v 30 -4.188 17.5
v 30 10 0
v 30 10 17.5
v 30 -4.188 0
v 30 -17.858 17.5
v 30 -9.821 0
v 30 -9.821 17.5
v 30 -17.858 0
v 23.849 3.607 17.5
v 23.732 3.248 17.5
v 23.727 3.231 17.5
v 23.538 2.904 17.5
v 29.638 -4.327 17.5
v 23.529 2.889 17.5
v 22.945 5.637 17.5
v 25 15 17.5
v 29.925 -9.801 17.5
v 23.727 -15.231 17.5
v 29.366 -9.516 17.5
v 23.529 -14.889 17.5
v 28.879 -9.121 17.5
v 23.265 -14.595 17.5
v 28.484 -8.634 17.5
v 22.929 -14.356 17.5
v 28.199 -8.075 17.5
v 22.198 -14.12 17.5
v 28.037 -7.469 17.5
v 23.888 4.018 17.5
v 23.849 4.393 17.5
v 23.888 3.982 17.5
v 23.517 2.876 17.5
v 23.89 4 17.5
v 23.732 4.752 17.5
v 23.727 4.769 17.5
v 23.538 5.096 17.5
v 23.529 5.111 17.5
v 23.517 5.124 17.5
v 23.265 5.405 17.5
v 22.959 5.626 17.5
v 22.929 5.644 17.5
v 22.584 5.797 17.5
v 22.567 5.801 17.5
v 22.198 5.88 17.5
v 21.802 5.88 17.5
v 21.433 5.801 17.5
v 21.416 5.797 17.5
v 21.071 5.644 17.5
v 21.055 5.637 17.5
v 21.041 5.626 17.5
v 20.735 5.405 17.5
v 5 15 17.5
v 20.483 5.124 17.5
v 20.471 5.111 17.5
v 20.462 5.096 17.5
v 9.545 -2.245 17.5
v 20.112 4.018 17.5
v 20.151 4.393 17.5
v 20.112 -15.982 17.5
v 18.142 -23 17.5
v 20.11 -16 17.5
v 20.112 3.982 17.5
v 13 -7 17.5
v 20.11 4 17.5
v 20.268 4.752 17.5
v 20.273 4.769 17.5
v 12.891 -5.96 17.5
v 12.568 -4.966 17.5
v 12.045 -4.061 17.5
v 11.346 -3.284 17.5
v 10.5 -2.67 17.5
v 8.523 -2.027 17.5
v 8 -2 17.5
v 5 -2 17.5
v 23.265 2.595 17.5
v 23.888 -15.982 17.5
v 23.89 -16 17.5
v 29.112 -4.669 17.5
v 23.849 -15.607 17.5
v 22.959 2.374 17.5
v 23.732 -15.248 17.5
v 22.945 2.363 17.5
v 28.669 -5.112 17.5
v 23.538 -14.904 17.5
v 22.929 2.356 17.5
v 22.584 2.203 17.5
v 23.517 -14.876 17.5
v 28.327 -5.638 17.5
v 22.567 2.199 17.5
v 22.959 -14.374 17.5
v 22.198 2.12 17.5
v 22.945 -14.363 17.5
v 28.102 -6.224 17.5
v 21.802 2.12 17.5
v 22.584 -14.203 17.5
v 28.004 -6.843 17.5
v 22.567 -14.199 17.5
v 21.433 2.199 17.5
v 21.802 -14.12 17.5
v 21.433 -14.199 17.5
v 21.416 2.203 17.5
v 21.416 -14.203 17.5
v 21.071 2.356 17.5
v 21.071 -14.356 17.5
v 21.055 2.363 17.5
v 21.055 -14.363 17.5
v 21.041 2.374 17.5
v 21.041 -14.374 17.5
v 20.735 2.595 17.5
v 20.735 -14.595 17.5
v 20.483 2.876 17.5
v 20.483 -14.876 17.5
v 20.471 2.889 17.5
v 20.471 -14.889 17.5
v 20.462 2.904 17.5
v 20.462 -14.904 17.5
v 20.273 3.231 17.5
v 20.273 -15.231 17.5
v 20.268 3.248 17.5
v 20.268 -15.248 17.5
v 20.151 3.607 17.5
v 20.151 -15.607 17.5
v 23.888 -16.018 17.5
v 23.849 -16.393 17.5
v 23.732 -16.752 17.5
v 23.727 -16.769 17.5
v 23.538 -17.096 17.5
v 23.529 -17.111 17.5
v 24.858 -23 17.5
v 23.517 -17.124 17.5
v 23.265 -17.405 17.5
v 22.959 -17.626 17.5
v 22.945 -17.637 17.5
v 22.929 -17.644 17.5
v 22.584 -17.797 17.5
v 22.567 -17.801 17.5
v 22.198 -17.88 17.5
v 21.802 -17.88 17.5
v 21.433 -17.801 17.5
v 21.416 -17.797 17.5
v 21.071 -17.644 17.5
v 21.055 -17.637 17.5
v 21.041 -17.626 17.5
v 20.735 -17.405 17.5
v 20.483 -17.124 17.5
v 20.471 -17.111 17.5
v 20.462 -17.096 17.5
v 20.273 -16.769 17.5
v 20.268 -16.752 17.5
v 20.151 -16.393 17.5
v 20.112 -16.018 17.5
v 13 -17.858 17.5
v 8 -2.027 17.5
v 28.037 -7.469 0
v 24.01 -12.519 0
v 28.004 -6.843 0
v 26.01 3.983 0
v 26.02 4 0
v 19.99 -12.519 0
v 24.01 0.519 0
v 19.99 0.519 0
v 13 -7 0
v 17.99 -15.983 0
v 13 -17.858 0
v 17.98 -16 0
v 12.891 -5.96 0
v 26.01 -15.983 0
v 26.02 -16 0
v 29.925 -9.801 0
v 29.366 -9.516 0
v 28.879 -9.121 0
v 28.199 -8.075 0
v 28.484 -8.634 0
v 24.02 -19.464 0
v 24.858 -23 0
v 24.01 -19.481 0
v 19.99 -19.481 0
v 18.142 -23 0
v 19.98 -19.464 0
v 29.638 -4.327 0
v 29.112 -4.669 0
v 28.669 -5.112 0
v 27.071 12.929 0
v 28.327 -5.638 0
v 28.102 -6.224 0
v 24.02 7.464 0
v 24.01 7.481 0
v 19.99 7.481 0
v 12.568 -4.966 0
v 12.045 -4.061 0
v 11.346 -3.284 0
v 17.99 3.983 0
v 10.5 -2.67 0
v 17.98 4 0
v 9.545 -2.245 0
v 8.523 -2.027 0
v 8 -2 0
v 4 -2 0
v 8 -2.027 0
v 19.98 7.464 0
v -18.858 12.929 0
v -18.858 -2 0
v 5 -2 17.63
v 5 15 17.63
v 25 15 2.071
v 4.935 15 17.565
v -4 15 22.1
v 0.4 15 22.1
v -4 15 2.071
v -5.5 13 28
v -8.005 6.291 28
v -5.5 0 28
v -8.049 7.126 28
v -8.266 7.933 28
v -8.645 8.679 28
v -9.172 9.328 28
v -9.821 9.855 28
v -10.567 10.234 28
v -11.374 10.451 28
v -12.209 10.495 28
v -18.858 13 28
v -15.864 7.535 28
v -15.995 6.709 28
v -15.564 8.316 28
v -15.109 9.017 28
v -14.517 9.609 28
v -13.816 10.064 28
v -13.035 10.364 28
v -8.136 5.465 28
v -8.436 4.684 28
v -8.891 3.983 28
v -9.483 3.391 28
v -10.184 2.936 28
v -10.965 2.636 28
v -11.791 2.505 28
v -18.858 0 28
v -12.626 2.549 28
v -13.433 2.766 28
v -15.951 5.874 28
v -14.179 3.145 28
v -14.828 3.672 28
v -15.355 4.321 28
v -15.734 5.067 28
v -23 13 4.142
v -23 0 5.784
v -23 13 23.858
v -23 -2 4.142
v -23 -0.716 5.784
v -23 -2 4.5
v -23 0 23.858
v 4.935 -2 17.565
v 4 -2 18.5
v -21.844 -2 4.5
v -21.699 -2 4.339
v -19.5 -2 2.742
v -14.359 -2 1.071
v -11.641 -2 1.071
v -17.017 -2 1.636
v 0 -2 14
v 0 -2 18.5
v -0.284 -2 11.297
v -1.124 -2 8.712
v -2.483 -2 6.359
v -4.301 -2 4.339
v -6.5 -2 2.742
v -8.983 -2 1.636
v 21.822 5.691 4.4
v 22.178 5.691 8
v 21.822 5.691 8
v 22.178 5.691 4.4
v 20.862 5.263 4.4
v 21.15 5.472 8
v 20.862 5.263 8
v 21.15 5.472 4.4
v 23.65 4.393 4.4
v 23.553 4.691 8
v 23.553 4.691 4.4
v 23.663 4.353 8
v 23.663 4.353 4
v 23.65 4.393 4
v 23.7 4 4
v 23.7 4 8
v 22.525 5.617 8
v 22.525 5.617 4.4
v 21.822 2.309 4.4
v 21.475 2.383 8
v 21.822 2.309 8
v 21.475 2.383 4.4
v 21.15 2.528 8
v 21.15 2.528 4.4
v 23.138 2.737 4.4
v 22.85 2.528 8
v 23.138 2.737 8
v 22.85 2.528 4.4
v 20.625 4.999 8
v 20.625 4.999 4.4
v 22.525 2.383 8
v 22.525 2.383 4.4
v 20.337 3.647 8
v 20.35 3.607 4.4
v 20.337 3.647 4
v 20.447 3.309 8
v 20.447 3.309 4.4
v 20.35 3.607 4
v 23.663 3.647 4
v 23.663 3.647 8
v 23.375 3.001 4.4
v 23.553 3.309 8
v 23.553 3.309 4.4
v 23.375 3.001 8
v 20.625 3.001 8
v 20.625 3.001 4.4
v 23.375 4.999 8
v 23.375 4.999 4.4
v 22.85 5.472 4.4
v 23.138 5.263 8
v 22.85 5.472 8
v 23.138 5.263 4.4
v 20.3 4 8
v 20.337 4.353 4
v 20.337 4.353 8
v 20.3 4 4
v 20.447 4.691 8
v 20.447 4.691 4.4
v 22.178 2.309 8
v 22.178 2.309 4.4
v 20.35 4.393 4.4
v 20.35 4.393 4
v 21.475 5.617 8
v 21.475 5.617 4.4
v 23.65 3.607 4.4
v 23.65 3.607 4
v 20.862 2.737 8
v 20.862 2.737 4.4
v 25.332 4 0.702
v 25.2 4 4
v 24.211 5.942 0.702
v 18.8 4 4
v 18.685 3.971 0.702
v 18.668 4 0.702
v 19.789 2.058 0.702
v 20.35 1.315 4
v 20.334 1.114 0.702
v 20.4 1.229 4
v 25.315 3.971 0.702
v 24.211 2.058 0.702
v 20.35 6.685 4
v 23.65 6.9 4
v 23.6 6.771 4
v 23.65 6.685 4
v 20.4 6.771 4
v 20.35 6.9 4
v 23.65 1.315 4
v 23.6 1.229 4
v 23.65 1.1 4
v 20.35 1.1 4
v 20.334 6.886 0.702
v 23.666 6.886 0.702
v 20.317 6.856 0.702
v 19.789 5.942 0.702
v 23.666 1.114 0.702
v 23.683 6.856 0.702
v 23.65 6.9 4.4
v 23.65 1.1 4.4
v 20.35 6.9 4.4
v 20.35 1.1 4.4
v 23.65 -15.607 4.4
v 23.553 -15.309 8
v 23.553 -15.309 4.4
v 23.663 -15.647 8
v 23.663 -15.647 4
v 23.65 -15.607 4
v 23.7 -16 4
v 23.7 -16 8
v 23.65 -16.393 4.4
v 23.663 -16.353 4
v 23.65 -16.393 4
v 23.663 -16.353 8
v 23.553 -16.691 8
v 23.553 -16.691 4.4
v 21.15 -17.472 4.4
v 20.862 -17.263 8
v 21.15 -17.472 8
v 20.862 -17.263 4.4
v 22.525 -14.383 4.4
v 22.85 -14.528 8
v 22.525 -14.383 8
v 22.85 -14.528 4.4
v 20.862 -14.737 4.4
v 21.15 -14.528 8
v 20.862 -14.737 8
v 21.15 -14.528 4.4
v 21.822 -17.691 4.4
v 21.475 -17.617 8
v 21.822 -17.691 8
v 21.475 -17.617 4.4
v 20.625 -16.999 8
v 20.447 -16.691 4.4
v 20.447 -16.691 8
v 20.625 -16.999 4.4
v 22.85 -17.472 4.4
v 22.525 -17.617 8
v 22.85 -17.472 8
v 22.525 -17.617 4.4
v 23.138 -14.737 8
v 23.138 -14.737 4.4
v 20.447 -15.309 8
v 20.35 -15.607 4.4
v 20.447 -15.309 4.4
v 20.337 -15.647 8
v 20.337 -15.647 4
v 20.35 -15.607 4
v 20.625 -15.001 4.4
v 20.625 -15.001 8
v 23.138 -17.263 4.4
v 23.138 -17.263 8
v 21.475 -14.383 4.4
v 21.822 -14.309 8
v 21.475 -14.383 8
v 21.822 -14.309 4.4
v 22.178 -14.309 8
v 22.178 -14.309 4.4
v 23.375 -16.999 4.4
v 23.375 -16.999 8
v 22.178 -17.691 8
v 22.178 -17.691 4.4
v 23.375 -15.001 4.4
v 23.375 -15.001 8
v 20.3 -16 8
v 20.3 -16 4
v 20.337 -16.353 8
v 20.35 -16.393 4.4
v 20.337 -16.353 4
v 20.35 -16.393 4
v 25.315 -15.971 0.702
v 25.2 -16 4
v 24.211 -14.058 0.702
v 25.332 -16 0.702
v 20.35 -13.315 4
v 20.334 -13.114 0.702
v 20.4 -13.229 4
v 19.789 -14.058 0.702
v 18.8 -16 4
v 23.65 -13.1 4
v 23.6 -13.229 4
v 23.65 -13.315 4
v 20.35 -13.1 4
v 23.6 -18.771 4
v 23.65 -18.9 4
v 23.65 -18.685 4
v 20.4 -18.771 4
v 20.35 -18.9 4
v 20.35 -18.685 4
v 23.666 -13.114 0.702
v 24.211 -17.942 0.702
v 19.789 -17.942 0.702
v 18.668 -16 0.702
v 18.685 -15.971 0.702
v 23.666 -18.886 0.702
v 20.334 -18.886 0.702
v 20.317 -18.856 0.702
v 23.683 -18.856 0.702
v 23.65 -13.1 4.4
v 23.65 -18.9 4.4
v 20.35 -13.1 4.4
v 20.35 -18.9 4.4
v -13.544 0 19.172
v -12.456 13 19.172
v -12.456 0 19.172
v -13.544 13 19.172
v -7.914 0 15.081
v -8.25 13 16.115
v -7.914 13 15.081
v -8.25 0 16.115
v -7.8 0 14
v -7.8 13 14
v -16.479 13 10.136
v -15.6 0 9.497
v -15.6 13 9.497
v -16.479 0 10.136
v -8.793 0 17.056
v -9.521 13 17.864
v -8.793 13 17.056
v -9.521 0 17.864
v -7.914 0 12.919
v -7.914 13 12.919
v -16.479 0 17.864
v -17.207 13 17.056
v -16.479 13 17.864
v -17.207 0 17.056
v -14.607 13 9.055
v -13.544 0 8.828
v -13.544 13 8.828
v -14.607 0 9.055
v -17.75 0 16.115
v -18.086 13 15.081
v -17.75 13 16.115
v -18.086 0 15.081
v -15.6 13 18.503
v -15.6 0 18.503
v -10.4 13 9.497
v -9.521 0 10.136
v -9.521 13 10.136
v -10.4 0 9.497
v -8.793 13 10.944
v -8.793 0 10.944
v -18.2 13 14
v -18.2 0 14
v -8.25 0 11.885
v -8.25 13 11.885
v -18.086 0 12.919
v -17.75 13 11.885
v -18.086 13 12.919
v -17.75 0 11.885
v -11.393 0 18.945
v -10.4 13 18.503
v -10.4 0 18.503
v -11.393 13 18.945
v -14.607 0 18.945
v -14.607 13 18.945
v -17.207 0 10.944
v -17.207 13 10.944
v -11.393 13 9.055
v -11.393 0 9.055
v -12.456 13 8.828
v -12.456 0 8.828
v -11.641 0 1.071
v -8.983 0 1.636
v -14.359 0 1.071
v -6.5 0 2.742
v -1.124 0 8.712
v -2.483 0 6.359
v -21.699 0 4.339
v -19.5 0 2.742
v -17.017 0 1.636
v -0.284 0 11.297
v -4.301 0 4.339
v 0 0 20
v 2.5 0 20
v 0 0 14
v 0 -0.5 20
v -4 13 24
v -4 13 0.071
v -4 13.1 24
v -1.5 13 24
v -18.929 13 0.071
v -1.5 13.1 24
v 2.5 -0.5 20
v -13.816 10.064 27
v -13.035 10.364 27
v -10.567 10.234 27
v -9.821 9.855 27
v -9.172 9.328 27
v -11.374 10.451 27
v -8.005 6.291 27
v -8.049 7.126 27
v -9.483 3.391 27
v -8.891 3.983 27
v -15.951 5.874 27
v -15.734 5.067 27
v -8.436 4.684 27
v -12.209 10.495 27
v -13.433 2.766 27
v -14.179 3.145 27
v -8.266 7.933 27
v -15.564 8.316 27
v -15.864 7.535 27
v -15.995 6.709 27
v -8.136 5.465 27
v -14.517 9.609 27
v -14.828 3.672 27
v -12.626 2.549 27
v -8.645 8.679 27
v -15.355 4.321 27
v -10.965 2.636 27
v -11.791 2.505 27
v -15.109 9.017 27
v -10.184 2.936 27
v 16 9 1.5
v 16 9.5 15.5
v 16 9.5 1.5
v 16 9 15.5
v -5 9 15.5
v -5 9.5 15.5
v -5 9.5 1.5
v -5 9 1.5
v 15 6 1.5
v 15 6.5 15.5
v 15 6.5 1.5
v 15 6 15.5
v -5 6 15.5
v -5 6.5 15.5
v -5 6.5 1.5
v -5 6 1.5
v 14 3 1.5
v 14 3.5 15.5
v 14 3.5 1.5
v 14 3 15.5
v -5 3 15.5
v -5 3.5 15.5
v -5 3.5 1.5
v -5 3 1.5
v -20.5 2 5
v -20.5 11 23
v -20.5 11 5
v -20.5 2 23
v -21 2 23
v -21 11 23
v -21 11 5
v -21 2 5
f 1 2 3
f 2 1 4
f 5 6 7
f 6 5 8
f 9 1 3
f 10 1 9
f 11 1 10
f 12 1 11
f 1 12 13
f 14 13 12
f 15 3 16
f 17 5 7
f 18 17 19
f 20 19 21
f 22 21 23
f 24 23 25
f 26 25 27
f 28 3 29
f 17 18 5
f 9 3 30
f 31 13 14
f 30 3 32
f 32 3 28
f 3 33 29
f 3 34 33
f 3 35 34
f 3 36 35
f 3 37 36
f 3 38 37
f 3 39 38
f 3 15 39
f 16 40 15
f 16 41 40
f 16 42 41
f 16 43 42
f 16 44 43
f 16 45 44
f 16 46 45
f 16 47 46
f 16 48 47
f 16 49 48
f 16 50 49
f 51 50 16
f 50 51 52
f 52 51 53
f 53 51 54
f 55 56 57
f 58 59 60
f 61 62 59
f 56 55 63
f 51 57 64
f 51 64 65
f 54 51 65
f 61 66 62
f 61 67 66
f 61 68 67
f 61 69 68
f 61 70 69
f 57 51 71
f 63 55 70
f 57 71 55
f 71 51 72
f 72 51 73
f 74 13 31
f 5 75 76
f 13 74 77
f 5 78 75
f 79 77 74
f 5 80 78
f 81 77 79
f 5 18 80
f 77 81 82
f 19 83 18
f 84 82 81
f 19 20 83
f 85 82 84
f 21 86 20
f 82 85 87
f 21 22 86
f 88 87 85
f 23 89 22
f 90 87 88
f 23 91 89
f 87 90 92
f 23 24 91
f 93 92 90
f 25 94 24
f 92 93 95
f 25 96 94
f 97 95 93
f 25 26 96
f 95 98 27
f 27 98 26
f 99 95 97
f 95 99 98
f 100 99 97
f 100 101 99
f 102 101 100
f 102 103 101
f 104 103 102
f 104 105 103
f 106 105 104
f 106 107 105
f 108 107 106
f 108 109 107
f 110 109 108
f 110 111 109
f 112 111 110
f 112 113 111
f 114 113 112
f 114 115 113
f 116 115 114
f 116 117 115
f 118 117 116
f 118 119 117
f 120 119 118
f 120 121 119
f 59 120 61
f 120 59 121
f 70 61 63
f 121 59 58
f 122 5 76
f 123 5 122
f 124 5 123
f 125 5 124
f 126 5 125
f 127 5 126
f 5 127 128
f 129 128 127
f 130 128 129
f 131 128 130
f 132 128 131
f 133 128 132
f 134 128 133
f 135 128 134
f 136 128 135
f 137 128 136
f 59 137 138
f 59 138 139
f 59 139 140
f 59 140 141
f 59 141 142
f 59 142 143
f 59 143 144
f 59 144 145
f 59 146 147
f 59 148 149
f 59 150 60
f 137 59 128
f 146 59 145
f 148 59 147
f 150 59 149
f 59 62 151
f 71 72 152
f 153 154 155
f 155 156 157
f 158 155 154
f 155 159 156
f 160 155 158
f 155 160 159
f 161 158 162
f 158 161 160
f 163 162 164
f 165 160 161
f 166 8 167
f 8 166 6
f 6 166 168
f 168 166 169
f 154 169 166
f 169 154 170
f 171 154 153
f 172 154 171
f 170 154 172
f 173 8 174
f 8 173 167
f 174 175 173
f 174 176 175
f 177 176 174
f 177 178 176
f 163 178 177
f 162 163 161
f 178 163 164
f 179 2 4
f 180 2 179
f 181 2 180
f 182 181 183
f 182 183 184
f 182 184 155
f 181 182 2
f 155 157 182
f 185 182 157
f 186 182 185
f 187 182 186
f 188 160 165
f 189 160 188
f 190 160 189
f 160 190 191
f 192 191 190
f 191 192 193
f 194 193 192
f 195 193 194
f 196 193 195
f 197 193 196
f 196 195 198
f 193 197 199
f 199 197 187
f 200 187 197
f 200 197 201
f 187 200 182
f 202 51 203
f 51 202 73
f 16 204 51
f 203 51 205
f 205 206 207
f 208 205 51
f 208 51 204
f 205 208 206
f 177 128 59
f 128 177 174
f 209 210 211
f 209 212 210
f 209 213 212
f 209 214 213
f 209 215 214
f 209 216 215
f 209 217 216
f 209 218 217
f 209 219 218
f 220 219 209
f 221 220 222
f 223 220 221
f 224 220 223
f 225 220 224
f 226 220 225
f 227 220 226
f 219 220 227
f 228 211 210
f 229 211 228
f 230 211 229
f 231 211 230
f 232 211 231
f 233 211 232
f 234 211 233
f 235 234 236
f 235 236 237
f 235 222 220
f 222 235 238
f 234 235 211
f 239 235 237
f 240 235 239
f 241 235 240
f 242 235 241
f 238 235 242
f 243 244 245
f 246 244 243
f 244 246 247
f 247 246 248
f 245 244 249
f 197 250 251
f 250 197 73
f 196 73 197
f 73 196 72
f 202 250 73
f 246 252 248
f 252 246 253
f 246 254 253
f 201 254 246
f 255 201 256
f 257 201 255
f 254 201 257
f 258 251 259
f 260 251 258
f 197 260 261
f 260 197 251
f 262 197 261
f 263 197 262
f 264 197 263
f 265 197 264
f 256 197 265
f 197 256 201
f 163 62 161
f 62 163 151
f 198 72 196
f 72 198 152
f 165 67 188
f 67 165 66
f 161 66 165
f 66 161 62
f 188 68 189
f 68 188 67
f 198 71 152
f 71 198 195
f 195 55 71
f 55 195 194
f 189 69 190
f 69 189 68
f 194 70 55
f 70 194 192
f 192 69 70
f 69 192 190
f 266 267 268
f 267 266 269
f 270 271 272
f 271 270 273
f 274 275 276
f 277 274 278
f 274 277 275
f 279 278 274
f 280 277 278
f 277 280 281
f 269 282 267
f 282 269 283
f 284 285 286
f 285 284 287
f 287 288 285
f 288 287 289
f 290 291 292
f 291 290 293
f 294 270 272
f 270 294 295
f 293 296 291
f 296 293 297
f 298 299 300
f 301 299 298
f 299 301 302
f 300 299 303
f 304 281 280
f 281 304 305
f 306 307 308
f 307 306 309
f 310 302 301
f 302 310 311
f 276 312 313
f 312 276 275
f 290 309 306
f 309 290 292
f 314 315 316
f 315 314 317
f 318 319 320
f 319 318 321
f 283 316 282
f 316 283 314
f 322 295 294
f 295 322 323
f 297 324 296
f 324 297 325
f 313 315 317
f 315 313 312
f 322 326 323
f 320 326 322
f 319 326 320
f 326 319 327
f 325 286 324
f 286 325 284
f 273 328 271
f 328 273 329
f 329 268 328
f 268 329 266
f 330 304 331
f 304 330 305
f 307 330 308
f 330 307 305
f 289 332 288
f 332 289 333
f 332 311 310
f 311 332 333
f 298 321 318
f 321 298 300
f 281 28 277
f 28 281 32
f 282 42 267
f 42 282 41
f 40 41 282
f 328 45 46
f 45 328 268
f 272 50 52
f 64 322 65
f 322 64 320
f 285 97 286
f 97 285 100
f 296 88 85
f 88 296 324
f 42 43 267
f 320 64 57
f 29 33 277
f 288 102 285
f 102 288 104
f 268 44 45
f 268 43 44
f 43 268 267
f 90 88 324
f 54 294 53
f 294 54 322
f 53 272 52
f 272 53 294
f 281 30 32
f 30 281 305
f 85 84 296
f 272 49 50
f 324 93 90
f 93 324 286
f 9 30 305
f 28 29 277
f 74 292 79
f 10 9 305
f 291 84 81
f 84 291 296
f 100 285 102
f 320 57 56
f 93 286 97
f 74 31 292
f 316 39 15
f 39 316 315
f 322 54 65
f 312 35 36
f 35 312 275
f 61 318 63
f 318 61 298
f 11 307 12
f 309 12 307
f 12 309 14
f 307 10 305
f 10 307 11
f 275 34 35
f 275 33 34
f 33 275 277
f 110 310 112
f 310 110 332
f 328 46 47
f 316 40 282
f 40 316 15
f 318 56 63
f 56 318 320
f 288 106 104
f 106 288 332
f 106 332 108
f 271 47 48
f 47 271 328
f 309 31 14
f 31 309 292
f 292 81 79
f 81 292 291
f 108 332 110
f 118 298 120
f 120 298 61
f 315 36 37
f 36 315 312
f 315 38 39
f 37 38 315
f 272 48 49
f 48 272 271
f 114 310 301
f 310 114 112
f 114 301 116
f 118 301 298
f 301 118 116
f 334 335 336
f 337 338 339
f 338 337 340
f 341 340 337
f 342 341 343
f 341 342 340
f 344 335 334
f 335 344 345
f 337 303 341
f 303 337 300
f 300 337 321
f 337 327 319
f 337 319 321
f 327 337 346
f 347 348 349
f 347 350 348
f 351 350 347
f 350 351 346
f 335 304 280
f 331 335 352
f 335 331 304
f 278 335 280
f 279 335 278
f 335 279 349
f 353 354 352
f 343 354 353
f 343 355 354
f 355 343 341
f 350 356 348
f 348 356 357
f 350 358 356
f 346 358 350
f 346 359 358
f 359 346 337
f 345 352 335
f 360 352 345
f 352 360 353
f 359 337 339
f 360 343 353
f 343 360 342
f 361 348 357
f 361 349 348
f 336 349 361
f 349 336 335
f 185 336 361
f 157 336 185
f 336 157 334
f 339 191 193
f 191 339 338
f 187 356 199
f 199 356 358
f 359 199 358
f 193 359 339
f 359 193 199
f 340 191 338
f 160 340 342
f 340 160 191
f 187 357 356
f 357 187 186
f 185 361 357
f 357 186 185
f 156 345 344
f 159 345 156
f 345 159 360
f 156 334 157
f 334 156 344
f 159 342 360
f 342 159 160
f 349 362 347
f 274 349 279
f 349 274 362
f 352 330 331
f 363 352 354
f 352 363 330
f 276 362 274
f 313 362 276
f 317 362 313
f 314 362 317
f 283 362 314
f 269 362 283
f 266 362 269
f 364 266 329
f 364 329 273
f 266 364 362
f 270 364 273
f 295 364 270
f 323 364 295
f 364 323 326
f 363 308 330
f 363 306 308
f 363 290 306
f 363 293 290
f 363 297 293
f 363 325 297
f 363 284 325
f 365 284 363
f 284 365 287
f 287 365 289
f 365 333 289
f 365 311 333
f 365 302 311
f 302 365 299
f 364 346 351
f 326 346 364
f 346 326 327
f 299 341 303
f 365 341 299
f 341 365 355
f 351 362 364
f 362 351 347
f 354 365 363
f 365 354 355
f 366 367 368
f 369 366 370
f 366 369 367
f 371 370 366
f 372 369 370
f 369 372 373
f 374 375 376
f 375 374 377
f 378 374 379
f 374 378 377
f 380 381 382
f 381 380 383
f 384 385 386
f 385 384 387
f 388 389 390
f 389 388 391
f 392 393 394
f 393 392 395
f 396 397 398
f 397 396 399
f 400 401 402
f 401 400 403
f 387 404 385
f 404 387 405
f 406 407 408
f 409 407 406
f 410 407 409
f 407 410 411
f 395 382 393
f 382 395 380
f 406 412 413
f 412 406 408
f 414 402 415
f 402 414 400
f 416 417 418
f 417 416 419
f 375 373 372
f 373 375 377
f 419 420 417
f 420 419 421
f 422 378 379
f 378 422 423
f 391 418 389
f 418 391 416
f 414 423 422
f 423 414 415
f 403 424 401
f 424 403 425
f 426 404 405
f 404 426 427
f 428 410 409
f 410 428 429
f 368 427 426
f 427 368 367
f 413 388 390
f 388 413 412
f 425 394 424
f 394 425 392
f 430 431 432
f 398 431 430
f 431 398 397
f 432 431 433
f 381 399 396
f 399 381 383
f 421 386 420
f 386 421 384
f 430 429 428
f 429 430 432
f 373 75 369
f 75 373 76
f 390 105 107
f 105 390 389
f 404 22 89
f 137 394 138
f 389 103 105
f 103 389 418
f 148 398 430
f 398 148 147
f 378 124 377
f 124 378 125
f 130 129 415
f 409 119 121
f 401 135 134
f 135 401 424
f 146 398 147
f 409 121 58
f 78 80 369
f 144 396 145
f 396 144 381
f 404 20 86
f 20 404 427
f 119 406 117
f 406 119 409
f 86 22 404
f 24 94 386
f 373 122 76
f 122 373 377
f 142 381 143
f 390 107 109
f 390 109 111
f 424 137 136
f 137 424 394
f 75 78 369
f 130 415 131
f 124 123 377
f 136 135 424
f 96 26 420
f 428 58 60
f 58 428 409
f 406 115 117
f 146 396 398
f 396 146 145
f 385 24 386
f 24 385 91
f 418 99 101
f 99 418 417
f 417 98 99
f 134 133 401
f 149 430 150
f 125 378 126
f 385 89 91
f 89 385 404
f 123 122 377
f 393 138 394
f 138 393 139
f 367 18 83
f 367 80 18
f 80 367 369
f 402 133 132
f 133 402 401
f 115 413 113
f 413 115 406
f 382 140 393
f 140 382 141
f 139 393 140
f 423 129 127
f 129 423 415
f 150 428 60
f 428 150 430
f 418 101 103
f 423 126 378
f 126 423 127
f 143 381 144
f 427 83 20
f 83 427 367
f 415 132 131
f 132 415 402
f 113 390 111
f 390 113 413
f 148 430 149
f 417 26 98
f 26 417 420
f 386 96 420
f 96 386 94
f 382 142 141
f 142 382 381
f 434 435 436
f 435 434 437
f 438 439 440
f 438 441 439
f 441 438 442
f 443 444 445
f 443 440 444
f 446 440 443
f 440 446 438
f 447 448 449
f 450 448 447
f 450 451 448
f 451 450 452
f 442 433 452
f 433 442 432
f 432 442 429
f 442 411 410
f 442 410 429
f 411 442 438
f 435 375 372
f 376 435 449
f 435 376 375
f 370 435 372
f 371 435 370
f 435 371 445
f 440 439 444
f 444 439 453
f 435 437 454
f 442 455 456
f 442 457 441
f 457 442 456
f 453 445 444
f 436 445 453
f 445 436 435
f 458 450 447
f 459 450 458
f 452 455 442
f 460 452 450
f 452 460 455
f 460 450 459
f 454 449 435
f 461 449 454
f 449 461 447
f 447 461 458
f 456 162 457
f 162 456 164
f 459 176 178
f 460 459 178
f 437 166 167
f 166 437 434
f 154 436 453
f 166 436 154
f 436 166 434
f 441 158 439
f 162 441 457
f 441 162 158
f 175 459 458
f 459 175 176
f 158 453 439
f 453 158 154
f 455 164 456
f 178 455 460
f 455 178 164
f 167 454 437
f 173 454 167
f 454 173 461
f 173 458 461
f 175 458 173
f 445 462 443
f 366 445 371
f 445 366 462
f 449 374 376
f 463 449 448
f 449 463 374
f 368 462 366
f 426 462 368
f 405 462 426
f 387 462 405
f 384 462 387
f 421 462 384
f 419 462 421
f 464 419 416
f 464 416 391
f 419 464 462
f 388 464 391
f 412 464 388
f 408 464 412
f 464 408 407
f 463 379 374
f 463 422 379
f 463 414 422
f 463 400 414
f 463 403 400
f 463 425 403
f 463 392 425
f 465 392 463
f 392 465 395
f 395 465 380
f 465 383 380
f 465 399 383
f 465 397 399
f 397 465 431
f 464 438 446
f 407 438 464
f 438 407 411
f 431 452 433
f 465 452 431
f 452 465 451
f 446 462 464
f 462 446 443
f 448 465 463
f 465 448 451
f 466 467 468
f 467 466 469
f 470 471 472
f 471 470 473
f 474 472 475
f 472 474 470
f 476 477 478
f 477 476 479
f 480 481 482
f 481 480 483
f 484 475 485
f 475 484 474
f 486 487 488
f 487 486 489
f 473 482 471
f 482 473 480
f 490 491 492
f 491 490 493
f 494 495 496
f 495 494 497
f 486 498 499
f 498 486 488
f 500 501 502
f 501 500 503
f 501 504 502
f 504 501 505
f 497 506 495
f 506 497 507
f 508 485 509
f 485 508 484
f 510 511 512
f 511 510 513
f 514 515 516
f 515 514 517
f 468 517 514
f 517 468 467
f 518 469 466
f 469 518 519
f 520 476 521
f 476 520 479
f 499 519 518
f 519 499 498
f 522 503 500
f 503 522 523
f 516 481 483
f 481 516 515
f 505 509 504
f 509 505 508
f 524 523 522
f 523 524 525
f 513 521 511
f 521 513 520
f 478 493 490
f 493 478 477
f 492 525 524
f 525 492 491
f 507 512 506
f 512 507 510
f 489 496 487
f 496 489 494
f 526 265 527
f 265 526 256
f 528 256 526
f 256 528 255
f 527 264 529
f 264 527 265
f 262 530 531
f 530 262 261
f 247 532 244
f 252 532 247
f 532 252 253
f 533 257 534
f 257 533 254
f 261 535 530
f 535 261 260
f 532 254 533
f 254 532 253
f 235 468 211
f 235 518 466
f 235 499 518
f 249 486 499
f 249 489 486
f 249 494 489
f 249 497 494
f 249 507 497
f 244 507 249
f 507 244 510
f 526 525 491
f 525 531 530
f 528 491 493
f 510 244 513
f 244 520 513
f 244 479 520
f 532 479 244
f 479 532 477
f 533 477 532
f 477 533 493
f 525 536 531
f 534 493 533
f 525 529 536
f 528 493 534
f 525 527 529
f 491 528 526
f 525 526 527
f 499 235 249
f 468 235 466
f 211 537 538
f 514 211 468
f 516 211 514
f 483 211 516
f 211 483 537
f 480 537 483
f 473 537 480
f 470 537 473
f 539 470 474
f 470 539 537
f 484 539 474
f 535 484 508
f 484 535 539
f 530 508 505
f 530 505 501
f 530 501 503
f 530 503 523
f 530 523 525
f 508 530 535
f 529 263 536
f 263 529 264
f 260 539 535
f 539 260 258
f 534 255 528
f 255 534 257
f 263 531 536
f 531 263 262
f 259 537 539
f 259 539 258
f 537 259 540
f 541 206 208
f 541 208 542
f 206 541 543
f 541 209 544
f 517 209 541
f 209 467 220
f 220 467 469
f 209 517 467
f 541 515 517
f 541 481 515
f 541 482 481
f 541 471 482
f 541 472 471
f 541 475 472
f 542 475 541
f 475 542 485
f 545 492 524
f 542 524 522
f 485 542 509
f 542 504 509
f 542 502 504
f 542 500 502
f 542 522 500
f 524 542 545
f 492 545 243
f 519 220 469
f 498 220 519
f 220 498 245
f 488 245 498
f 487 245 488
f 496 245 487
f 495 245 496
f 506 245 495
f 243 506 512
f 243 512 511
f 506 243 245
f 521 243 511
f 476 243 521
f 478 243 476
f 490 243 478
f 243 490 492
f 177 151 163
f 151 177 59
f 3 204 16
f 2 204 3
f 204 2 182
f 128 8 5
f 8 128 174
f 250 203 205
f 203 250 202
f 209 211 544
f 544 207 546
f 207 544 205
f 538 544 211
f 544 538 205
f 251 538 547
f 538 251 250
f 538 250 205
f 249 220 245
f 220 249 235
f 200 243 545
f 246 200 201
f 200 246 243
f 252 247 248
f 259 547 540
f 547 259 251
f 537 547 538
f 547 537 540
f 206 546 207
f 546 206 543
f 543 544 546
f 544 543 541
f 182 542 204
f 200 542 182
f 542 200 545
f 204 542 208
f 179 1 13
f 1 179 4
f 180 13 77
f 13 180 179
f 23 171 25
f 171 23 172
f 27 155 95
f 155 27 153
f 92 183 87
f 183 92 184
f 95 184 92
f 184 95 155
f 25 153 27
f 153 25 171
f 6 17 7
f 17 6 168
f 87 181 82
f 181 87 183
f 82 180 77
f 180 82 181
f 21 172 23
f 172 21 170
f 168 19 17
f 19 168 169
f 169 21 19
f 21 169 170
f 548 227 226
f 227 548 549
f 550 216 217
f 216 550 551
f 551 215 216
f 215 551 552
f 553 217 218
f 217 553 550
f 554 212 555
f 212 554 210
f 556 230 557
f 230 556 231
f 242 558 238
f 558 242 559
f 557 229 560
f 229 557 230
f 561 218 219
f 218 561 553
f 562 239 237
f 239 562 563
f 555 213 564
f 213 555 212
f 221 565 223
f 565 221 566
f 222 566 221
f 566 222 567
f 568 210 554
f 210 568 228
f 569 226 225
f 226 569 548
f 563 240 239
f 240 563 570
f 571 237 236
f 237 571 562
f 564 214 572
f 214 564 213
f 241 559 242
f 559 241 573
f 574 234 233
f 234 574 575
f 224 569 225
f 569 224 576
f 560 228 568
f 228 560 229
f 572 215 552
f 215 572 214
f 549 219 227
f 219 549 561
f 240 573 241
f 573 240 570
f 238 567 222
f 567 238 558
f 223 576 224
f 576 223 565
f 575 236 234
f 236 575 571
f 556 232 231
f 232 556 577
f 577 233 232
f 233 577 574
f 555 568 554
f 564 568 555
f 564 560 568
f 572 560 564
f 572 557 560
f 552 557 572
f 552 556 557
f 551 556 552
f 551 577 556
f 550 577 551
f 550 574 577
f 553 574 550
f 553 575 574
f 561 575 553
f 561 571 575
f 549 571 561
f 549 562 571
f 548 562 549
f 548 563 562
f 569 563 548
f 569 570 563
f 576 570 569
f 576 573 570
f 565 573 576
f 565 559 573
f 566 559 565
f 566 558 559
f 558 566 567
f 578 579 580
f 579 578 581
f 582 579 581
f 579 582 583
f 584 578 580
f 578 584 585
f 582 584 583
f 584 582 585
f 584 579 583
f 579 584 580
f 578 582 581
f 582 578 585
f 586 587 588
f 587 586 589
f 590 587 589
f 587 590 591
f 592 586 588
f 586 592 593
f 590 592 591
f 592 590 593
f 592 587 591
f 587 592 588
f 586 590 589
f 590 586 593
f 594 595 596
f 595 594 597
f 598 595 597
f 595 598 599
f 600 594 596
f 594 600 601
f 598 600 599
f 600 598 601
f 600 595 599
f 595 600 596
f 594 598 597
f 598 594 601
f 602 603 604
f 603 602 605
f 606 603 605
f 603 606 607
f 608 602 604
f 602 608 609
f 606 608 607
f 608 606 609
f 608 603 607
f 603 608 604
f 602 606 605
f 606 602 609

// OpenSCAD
// PRUSA iteration3
// PSU-Y reinforcement part
// GNU GPL v3
// Josef Průša <iam@josefprusa.cz> and contributors
// http://www.reprap.org/wiki/Prusa_Mendel
// http://prusamendel.org

module base(){
    union(){
        difference(){
            union(){
                translate([5,-23,0]) cube([25,38,17.5]); // Horizontal plate
                translate([-23,-2,0]) cube([28,17,28]); // Y_Corner block
            }
            translate([4,-25,-1]) cube([9,23,20]); // Holder side cut
        }
        difference(){
            translate([8,-7,0]) cube([5,5,17.5]); // Fillet block
            translate([8,-7,-1]) cylinder(h=28,r=5,$fn=30); // Fillet cut
            }
        }
}

module cutout(){
    translate([22,4,-2]) cylinder(h=20,r=1.7,$fn=30); // M3 hole A
    translate([22,4,8]) cylinder(h=10,r1=1.7,r2=1.9,$fn=30); // M3 hole A
    translate([22,4,-1]) cylinder(h=5,r1=3.4,r2=3.2,$fn=6); // M3 nut body A
    translate([22,4,-1]) cylinder(h=5,r2=0.1,r1=5,$fn=6); // M3 nut hole fillet A
    translate([22,4,4.2]) cube([3.3,5.8,0.4],center=true); // Bridge force A

    translate([22,-16,-2]) cylinder(h=20,r=1.7,$fn=30);  // M3 hole B
    translate([22,-16,8]) cylinder(h=10,r1=1.7,r2=1.9,$fn=30); // M3 hole B
    translate([22,-16,-1]) cylinder(h=5,r1=3.4,r2=3.2,$fn=6); // M3 nut body B
    translate([22,-16,-1]) cylinder(h=5,r1=5,r2=0.1,$fn=6); // M3 nut hole B fillet
    translate([22,-16,4.2]) cube([3.3,5.8,0.4],center=true); // Bridge force B

    translate([-13,14,14]) rotate([90,0,0]) cylinder(h= 25,r=5.2,$fn=30); // Threaded rod

    translate([-13,0,14]) rotate([90,0,0]) cylinder(h=4,r=13,$fn=30); // Washer
    translate([-29,-7,14]) cube([29,7,18]); // Washer upper cut

    translate([-24,13,-1]) cube([20,15,30]); // Y_Corner cutaway

    // Vertical corners 45 degree cut
    translate([12,-31,-2]) rotate([0,0,45]) cube([10,10,21]);
    translate([31,9,-2])  rotate([0,0,45]) cube([10,10,21]);
    translate([31,-31,-2]) rotate([0,0,45]) cube([10,10,21]);

    // Horizontal corners 45 degree cut
    translate([-8.5,-8,31]) rotate([0,45,0]) cube([19,40,20]);
    translate([-31,-6,30]) rotate([0,45,0])  cube([10,35,10]);
    translate([-31,-6,-2]) rotate([0,45,0]) cube([10,35,10]);
    translate([-26,-4,2.5]) rotate([45,0,0]) cube([5,5,5]);
    translate([-1,-4,16.5]) rotate([45,0,0]) cube([5,5,5]);
    translate([-1,-5,20]) cube([5,5,5]);
    translate([-5,16.6,20.5]) rotate([45,0,0]) cube([6,5,5]);
    translate([-5,13,24]) cube([6,5,5]);
    translate([-30,15,-5]) rotate([45,0,0]) cube([70,5,5]);

    translate([31,-7,-1]) rotate([0,0,45]) cylinder(h=25,r=3,$fn=30);
    translate([-12,6.5,27]) rotate([0,0,45]) cylinder(h= 25,r=4,$fn=30);

    translate([-5,9,1.5]) cube([21,0.5,14]);
    translate([-5,6,1.5]) cube([20,0.5,14]);
    translate([-5,3,1.5]) cube([19,0.5,14]);
    translate([-21,2,5]) cube([0.5,9,18]);
    }

module final_part(){
    difference(){
        base();
        cutout();
    }
}

final_part();
